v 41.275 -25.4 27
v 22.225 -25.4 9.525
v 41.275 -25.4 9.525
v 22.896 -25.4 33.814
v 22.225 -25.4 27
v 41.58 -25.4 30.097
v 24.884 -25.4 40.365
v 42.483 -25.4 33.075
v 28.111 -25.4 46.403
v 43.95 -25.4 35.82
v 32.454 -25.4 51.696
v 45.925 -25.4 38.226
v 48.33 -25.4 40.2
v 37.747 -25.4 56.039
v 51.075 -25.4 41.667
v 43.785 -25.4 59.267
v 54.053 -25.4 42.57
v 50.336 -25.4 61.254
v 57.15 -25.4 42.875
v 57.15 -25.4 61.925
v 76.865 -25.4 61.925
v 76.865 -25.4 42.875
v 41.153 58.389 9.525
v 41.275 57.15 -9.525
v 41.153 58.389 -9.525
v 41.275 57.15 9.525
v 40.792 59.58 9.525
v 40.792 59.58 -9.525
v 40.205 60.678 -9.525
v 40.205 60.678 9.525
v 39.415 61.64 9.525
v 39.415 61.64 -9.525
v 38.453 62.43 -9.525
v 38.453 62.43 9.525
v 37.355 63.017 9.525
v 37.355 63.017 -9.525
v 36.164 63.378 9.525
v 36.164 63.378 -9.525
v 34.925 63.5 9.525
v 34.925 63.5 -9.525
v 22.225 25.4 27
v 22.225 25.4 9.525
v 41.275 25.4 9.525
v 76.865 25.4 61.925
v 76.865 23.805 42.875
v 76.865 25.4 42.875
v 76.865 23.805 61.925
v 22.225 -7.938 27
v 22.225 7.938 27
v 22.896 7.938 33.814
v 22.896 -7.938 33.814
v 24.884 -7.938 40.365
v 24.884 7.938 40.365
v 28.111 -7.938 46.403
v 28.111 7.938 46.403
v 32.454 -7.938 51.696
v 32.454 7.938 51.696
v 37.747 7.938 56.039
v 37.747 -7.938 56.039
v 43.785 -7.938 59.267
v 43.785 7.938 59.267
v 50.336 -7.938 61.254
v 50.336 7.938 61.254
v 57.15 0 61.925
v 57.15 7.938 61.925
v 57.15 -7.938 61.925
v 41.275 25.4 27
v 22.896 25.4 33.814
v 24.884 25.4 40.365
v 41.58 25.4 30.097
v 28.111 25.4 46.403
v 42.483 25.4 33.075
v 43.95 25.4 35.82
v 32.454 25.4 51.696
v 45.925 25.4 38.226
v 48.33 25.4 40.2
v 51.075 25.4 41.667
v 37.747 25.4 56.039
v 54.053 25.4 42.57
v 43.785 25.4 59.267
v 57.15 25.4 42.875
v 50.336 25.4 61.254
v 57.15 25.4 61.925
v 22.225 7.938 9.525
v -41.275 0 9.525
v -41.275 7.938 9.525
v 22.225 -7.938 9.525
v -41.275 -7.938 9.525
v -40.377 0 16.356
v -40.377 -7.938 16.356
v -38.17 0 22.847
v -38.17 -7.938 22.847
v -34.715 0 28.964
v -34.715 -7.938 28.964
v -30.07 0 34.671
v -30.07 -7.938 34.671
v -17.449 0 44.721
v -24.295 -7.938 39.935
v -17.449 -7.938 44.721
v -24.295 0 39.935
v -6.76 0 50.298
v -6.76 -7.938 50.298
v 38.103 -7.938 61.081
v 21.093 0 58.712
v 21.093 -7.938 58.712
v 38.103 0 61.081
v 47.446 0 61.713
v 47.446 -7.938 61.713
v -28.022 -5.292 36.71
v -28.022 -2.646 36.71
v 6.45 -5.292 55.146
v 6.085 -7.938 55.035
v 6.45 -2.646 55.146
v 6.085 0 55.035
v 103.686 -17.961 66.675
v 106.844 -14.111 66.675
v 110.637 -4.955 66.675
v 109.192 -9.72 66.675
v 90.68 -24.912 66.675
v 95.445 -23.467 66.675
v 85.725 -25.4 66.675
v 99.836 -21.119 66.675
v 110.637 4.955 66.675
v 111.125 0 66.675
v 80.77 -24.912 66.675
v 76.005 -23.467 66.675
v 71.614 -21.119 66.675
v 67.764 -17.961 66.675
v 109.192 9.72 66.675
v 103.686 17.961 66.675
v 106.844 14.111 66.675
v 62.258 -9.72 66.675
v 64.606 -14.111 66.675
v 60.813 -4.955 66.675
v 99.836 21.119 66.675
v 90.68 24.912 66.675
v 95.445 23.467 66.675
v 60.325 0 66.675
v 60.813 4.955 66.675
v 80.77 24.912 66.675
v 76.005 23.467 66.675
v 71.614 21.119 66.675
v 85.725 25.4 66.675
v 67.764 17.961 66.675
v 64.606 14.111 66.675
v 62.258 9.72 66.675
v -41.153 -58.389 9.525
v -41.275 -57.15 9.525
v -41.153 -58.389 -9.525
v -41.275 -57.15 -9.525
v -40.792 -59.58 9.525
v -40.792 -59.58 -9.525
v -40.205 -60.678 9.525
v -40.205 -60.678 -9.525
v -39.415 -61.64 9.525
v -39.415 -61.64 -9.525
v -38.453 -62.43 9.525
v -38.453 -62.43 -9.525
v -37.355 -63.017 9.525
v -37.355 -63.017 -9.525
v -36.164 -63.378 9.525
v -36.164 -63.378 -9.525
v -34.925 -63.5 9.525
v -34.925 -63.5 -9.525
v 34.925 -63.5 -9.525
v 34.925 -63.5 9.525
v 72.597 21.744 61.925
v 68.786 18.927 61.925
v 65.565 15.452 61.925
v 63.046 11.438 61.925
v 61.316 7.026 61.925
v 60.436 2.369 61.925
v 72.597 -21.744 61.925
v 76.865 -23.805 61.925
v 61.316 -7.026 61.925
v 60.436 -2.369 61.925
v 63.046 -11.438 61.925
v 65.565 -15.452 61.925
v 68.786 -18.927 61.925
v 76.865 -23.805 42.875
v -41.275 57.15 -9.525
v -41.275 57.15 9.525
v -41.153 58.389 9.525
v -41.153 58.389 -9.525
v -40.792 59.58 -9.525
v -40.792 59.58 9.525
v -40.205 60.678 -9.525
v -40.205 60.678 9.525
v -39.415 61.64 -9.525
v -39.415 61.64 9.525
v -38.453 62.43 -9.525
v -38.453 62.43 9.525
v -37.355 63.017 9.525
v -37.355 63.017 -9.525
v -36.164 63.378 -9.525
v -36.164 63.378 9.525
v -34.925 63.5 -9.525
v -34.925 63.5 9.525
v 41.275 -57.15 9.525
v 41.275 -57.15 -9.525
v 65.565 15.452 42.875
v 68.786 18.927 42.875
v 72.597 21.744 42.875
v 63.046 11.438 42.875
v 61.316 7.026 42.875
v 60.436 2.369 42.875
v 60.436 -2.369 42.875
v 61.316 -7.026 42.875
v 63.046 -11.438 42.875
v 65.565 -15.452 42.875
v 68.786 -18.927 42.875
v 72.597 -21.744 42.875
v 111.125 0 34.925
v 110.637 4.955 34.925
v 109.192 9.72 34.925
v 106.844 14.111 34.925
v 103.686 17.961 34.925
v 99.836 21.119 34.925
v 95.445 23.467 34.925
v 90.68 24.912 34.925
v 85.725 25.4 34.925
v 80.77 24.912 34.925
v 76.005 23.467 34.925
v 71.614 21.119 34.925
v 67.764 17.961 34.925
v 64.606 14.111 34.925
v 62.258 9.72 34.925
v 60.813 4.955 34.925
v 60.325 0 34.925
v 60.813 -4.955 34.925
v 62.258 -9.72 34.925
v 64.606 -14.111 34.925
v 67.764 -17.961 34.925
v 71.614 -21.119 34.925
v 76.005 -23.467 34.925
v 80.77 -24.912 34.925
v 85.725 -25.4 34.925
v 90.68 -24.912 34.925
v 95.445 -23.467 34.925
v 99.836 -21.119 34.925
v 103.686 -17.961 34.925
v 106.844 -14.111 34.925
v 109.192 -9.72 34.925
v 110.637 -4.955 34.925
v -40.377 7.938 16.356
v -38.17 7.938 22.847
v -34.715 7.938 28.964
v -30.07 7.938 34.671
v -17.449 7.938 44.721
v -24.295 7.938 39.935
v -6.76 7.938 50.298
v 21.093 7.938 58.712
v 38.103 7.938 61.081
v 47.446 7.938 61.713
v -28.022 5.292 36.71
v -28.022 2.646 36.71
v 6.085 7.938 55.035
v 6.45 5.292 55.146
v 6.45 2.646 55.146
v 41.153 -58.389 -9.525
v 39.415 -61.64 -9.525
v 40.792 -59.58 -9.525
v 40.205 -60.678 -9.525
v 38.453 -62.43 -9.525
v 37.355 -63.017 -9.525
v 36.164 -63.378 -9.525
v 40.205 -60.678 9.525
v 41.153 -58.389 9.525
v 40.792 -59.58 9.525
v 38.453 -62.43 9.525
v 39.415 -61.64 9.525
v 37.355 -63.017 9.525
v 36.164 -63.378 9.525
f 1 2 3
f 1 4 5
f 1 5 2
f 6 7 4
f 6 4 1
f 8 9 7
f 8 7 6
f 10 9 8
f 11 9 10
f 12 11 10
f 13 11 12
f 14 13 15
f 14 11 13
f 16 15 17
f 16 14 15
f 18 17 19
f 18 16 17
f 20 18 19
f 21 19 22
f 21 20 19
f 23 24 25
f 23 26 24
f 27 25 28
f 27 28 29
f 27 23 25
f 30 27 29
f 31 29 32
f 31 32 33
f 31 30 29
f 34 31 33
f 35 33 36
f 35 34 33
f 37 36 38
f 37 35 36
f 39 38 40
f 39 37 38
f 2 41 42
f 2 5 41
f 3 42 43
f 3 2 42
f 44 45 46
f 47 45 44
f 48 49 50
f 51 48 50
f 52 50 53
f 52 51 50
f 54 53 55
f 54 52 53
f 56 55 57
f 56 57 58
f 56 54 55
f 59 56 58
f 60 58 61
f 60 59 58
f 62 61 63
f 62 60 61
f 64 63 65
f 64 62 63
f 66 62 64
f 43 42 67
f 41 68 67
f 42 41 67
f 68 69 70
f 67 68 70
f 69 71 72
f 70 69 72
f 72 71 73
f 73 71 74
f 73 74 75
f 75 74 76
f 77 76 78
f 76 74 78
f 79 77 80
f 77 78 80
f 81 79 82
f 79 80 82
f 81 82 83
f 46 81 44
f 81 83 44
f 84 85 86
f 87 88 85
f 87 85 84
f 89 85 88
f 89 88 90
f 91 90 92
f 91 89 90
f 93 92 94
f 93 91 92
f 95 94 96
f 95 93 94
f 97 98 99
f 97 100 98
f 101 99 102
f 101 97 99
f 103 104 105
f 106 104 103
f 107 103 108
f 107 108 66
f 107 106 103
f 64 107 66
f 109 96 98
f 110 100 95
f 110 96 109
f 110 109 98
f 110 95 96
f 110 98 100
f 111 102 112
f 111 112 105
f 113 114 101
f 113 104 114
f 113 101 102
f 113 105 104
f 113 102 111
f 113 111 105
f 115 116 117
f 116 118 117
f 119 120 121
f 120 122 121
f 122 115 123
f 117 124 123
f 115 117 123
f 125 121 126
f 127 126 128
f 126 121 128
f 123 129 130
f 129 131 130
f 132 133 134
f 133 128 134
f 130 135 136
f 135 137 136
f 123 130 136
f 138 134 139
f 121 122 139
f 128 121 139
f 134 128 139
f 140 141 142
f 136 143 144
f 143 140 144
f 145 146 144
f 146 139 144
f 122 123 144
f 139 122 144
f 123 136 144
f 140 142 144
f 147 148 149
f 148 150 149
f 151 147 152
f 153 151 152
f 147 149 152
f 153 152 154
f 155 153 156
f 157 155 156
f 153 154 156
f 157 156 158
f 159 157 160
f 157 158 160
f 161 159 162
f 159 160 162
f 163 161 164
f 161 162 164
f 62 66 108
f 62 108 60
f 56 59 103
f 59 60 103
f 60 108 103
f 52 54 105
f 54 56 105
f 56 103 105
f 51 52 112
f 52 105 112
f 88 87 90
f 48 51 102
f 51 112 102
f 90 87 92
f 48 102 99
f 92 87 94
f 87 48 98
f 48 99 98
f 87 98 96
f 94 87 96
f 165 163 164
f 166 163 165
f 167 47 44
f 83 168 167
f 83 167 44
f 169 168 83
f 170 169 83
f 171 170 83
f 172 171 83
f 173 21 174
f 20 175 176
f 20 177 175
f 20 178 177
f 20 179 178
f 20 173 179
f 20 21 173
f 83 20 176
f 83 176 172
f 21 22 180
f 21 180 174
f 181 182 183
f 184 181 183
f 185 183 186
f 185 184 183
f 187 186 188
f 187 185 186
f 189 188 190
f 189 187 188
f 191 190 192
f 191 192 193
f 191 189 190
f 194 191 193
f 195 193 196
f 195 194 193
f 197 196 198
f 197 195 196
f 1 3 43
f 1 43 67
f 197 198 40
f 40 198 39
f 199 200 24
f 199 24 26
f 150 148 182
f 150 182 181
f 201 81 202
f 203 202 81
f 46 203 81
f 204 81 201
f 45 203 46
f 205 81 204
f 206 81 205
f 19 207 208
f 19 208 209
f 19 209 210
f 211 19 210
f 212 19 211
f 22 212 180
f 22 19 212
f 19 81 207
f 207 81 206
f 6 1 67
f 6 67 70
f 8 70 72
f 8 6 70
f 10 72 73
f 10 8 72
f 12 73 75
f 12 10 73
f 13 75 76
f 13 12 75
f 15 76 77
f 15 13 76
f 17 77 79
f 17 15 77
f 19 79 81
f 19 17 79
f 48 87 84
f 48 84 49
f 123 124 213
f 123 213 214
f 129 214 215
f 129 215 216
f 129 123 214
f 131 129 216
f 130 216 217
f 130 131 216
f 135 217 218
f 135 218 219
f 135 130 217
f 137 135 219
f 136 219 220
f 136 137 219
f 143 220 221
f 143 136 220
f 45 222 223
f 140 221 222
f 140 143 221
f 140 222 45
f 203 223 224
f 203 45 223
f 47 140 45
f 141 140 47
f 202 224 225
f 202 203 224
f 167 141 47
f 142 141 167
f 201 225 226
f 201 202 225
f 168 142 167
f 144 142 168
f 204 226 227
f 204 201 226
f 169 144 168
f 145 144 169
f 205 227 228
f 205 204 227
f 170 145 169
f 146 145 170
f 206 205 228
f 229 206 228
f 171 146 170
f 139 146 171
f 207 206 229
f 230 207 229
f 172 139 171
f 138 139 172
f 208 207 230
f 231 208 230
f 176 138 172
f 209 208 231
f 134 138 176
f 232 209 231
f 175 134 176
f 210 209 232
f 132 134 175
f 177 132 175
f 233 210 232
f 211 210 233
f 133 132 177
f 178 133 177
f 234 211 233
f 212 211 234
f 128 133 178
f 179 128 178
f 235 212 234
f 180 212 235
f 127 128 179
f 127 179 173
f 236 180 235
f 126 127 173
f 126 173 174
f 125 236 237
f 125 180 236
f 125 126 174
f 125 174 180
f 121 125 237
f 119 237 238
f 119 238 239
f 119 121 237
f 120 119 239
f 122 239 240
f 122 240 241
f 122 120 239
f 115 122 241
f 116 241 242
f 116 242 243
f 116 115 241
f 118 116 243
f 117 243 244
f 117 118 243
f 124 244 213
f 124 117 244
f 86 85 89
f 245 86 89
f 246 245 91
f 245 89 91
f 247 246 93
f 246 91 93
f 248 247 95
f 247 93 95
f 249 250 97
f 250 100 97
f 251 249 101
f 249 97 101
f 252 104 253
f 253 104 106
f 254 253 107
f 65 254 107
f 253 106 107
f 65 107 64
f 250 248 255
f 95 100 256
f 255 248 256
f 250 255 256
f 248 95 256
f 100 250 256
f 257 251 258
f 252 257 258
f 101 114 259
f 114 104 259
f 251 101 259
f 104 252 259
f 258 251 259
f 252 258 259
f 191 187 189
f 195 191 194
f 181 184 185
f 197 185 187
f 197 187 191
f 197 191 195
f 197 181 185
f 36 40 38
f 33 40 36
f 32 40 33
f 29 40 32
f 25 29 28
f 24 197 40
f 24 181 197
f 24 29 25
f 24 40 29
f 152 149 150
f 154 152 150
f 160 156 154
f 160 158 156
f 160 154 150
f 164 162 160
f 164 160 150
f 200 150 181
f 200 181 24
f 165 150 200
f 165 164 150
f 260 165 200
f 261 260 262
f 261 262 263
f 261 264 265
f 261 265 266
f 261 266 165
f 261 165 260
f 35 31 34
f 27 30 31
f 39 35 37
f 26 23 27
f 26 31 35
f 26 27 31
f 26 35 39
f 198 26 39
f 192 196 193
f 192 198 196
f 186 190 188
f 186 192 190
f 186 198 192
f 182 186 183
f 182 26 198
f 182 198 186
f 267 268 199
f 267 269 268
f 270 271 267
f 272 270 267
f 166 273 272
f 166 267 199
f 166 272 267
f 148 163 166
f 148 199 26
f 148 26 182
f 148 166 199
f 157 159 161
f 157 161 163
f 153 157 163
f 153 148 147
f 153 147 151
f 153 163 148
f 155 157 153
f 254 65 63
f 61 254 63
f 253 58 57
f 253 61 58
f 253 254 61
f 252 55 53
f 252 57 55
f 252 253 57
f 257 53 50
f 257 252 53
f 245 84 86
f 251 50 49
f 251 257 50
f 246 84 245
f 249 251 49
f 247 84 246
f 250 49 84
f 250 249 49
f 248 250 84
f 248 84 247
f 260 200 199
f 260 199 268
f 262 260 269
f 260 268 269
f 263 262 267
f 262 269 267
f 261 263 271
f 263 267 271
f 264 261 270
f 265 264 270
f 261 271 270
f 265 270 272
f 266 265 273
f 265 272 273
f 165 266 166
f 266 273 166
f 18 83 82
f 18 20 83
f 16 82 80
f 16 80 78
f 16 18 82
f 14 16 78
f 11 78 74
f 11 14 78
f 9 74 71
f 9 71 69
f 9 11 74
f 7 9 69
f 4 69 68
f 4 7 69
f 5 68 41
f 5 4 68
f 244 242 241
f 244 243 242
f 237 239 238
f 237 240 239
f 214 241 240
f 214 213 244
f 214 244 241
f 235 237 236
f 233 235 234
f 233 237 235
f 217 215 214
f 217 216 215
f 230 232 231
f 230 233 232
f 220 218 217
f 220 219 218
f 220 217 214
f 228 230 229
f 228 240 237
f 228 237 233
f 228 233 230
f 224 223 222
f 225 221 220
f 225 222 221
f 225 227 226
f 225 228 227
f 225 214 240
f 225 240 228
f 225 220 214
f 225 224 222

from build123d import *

# Parameters (mm, degrees)
F1_DEPTH = 63.5
F0_W     = 16.539878
F0_H     = 19.05
F2_DEPTH = 25.4
F3_DEPTH = 7.9375
F0_W_2   = 25.4
F0_H_2   = 31.75
F5_R     = 6.35


with BuildPart() as f1:
    # F0 (on Front) → F1 (new body, symmetric)
    with BuildSketch(Plane.XZ):
        Polygon((-41.275, 9.525), (-41.275, -9.525), (41.275, -9.525), (41.275, 9.525), (22.225, 9.525), align=None)
    extrude(amount=F1_DEPTH, both=True)

    # F5
    f5_edges = [f1.edges().sort_by_distance(p)[0] for p in [
        (-41.275, -63.5, 0),
        (41.275, -63.5, 0),
        (41.275, 63.5, 0),
        (-41.275, 63.5, 0),
    ]]
    fillet(f5_edges, radius=F5_R)


with BuildPart() as f2:
    # F0 (on Front) → F2 (new body, symmetric)
    with BuildSketch(Plane.XZ):
        with BuildLine():
            Line((22.225, 9.525), (41.275, 9.525))
            Line((41.275, 9.525), (41.275, 27.0002))
            ThreePointArc((41.275, 27.0002), (45.92468, 38.22552), (57.15, 42.8752))
            Line((57.15, 42.8752), (60.325, 42.8752))
            Line((60.325, 42.8752), (60.325, 61.9252))
            Line((60.325, 61.9252), (57.15, 61.9252))
            ThreePointArc((57.15, 61.9252), (32.454296, 51.695904), (22.225, 27.0002))
            Line((22.225, 27.0002), (22.225, 9.525))
        make_face()
        with Locations((68.594939, 52.4002)):
            Rectangle(F0_W, F0_H)
    extrude(amount=F2_DEPTH, both=True)

    # F0 (on Front) → F4 (revolve)
    with BuildSketch(Plane.XZ):
        with Locations((98.425, 50.8)):
            Rectangle(F0_W_2, F0_H_2)
    revolve(axis=Axis((85.725, 0, 50.8), (0, 0, 1)))


with BuildPart() as f3:
    # F0 (on Front) → F3 (new body, symmetric)
    with BuildSketch(Plane.XZ):
        with BuildLine():
            add(Edge.make_bspline(
                [(-41.275, 9.525), (-40.294466, 40.116504), (0, 61.942085), (57.15, 61.9252)],
                knots=[0, 0, 0, 0, 111.504536, 111.504536, 111.504536, 111.504536], degree=3))
            Line((-41.275, 9.525), (22.225, 9.525))
            Line((22.225, 9.525), (22.225, 27.0002))
            ThreePointArc((22.225, 27.0002), (32.454296, 51.695904), (57.15, 61.9252))
        make_face()
    extrude(amount=F3_DEPTH, both=True)


solid = Compound([f1.part, f2.part, f3.part])
